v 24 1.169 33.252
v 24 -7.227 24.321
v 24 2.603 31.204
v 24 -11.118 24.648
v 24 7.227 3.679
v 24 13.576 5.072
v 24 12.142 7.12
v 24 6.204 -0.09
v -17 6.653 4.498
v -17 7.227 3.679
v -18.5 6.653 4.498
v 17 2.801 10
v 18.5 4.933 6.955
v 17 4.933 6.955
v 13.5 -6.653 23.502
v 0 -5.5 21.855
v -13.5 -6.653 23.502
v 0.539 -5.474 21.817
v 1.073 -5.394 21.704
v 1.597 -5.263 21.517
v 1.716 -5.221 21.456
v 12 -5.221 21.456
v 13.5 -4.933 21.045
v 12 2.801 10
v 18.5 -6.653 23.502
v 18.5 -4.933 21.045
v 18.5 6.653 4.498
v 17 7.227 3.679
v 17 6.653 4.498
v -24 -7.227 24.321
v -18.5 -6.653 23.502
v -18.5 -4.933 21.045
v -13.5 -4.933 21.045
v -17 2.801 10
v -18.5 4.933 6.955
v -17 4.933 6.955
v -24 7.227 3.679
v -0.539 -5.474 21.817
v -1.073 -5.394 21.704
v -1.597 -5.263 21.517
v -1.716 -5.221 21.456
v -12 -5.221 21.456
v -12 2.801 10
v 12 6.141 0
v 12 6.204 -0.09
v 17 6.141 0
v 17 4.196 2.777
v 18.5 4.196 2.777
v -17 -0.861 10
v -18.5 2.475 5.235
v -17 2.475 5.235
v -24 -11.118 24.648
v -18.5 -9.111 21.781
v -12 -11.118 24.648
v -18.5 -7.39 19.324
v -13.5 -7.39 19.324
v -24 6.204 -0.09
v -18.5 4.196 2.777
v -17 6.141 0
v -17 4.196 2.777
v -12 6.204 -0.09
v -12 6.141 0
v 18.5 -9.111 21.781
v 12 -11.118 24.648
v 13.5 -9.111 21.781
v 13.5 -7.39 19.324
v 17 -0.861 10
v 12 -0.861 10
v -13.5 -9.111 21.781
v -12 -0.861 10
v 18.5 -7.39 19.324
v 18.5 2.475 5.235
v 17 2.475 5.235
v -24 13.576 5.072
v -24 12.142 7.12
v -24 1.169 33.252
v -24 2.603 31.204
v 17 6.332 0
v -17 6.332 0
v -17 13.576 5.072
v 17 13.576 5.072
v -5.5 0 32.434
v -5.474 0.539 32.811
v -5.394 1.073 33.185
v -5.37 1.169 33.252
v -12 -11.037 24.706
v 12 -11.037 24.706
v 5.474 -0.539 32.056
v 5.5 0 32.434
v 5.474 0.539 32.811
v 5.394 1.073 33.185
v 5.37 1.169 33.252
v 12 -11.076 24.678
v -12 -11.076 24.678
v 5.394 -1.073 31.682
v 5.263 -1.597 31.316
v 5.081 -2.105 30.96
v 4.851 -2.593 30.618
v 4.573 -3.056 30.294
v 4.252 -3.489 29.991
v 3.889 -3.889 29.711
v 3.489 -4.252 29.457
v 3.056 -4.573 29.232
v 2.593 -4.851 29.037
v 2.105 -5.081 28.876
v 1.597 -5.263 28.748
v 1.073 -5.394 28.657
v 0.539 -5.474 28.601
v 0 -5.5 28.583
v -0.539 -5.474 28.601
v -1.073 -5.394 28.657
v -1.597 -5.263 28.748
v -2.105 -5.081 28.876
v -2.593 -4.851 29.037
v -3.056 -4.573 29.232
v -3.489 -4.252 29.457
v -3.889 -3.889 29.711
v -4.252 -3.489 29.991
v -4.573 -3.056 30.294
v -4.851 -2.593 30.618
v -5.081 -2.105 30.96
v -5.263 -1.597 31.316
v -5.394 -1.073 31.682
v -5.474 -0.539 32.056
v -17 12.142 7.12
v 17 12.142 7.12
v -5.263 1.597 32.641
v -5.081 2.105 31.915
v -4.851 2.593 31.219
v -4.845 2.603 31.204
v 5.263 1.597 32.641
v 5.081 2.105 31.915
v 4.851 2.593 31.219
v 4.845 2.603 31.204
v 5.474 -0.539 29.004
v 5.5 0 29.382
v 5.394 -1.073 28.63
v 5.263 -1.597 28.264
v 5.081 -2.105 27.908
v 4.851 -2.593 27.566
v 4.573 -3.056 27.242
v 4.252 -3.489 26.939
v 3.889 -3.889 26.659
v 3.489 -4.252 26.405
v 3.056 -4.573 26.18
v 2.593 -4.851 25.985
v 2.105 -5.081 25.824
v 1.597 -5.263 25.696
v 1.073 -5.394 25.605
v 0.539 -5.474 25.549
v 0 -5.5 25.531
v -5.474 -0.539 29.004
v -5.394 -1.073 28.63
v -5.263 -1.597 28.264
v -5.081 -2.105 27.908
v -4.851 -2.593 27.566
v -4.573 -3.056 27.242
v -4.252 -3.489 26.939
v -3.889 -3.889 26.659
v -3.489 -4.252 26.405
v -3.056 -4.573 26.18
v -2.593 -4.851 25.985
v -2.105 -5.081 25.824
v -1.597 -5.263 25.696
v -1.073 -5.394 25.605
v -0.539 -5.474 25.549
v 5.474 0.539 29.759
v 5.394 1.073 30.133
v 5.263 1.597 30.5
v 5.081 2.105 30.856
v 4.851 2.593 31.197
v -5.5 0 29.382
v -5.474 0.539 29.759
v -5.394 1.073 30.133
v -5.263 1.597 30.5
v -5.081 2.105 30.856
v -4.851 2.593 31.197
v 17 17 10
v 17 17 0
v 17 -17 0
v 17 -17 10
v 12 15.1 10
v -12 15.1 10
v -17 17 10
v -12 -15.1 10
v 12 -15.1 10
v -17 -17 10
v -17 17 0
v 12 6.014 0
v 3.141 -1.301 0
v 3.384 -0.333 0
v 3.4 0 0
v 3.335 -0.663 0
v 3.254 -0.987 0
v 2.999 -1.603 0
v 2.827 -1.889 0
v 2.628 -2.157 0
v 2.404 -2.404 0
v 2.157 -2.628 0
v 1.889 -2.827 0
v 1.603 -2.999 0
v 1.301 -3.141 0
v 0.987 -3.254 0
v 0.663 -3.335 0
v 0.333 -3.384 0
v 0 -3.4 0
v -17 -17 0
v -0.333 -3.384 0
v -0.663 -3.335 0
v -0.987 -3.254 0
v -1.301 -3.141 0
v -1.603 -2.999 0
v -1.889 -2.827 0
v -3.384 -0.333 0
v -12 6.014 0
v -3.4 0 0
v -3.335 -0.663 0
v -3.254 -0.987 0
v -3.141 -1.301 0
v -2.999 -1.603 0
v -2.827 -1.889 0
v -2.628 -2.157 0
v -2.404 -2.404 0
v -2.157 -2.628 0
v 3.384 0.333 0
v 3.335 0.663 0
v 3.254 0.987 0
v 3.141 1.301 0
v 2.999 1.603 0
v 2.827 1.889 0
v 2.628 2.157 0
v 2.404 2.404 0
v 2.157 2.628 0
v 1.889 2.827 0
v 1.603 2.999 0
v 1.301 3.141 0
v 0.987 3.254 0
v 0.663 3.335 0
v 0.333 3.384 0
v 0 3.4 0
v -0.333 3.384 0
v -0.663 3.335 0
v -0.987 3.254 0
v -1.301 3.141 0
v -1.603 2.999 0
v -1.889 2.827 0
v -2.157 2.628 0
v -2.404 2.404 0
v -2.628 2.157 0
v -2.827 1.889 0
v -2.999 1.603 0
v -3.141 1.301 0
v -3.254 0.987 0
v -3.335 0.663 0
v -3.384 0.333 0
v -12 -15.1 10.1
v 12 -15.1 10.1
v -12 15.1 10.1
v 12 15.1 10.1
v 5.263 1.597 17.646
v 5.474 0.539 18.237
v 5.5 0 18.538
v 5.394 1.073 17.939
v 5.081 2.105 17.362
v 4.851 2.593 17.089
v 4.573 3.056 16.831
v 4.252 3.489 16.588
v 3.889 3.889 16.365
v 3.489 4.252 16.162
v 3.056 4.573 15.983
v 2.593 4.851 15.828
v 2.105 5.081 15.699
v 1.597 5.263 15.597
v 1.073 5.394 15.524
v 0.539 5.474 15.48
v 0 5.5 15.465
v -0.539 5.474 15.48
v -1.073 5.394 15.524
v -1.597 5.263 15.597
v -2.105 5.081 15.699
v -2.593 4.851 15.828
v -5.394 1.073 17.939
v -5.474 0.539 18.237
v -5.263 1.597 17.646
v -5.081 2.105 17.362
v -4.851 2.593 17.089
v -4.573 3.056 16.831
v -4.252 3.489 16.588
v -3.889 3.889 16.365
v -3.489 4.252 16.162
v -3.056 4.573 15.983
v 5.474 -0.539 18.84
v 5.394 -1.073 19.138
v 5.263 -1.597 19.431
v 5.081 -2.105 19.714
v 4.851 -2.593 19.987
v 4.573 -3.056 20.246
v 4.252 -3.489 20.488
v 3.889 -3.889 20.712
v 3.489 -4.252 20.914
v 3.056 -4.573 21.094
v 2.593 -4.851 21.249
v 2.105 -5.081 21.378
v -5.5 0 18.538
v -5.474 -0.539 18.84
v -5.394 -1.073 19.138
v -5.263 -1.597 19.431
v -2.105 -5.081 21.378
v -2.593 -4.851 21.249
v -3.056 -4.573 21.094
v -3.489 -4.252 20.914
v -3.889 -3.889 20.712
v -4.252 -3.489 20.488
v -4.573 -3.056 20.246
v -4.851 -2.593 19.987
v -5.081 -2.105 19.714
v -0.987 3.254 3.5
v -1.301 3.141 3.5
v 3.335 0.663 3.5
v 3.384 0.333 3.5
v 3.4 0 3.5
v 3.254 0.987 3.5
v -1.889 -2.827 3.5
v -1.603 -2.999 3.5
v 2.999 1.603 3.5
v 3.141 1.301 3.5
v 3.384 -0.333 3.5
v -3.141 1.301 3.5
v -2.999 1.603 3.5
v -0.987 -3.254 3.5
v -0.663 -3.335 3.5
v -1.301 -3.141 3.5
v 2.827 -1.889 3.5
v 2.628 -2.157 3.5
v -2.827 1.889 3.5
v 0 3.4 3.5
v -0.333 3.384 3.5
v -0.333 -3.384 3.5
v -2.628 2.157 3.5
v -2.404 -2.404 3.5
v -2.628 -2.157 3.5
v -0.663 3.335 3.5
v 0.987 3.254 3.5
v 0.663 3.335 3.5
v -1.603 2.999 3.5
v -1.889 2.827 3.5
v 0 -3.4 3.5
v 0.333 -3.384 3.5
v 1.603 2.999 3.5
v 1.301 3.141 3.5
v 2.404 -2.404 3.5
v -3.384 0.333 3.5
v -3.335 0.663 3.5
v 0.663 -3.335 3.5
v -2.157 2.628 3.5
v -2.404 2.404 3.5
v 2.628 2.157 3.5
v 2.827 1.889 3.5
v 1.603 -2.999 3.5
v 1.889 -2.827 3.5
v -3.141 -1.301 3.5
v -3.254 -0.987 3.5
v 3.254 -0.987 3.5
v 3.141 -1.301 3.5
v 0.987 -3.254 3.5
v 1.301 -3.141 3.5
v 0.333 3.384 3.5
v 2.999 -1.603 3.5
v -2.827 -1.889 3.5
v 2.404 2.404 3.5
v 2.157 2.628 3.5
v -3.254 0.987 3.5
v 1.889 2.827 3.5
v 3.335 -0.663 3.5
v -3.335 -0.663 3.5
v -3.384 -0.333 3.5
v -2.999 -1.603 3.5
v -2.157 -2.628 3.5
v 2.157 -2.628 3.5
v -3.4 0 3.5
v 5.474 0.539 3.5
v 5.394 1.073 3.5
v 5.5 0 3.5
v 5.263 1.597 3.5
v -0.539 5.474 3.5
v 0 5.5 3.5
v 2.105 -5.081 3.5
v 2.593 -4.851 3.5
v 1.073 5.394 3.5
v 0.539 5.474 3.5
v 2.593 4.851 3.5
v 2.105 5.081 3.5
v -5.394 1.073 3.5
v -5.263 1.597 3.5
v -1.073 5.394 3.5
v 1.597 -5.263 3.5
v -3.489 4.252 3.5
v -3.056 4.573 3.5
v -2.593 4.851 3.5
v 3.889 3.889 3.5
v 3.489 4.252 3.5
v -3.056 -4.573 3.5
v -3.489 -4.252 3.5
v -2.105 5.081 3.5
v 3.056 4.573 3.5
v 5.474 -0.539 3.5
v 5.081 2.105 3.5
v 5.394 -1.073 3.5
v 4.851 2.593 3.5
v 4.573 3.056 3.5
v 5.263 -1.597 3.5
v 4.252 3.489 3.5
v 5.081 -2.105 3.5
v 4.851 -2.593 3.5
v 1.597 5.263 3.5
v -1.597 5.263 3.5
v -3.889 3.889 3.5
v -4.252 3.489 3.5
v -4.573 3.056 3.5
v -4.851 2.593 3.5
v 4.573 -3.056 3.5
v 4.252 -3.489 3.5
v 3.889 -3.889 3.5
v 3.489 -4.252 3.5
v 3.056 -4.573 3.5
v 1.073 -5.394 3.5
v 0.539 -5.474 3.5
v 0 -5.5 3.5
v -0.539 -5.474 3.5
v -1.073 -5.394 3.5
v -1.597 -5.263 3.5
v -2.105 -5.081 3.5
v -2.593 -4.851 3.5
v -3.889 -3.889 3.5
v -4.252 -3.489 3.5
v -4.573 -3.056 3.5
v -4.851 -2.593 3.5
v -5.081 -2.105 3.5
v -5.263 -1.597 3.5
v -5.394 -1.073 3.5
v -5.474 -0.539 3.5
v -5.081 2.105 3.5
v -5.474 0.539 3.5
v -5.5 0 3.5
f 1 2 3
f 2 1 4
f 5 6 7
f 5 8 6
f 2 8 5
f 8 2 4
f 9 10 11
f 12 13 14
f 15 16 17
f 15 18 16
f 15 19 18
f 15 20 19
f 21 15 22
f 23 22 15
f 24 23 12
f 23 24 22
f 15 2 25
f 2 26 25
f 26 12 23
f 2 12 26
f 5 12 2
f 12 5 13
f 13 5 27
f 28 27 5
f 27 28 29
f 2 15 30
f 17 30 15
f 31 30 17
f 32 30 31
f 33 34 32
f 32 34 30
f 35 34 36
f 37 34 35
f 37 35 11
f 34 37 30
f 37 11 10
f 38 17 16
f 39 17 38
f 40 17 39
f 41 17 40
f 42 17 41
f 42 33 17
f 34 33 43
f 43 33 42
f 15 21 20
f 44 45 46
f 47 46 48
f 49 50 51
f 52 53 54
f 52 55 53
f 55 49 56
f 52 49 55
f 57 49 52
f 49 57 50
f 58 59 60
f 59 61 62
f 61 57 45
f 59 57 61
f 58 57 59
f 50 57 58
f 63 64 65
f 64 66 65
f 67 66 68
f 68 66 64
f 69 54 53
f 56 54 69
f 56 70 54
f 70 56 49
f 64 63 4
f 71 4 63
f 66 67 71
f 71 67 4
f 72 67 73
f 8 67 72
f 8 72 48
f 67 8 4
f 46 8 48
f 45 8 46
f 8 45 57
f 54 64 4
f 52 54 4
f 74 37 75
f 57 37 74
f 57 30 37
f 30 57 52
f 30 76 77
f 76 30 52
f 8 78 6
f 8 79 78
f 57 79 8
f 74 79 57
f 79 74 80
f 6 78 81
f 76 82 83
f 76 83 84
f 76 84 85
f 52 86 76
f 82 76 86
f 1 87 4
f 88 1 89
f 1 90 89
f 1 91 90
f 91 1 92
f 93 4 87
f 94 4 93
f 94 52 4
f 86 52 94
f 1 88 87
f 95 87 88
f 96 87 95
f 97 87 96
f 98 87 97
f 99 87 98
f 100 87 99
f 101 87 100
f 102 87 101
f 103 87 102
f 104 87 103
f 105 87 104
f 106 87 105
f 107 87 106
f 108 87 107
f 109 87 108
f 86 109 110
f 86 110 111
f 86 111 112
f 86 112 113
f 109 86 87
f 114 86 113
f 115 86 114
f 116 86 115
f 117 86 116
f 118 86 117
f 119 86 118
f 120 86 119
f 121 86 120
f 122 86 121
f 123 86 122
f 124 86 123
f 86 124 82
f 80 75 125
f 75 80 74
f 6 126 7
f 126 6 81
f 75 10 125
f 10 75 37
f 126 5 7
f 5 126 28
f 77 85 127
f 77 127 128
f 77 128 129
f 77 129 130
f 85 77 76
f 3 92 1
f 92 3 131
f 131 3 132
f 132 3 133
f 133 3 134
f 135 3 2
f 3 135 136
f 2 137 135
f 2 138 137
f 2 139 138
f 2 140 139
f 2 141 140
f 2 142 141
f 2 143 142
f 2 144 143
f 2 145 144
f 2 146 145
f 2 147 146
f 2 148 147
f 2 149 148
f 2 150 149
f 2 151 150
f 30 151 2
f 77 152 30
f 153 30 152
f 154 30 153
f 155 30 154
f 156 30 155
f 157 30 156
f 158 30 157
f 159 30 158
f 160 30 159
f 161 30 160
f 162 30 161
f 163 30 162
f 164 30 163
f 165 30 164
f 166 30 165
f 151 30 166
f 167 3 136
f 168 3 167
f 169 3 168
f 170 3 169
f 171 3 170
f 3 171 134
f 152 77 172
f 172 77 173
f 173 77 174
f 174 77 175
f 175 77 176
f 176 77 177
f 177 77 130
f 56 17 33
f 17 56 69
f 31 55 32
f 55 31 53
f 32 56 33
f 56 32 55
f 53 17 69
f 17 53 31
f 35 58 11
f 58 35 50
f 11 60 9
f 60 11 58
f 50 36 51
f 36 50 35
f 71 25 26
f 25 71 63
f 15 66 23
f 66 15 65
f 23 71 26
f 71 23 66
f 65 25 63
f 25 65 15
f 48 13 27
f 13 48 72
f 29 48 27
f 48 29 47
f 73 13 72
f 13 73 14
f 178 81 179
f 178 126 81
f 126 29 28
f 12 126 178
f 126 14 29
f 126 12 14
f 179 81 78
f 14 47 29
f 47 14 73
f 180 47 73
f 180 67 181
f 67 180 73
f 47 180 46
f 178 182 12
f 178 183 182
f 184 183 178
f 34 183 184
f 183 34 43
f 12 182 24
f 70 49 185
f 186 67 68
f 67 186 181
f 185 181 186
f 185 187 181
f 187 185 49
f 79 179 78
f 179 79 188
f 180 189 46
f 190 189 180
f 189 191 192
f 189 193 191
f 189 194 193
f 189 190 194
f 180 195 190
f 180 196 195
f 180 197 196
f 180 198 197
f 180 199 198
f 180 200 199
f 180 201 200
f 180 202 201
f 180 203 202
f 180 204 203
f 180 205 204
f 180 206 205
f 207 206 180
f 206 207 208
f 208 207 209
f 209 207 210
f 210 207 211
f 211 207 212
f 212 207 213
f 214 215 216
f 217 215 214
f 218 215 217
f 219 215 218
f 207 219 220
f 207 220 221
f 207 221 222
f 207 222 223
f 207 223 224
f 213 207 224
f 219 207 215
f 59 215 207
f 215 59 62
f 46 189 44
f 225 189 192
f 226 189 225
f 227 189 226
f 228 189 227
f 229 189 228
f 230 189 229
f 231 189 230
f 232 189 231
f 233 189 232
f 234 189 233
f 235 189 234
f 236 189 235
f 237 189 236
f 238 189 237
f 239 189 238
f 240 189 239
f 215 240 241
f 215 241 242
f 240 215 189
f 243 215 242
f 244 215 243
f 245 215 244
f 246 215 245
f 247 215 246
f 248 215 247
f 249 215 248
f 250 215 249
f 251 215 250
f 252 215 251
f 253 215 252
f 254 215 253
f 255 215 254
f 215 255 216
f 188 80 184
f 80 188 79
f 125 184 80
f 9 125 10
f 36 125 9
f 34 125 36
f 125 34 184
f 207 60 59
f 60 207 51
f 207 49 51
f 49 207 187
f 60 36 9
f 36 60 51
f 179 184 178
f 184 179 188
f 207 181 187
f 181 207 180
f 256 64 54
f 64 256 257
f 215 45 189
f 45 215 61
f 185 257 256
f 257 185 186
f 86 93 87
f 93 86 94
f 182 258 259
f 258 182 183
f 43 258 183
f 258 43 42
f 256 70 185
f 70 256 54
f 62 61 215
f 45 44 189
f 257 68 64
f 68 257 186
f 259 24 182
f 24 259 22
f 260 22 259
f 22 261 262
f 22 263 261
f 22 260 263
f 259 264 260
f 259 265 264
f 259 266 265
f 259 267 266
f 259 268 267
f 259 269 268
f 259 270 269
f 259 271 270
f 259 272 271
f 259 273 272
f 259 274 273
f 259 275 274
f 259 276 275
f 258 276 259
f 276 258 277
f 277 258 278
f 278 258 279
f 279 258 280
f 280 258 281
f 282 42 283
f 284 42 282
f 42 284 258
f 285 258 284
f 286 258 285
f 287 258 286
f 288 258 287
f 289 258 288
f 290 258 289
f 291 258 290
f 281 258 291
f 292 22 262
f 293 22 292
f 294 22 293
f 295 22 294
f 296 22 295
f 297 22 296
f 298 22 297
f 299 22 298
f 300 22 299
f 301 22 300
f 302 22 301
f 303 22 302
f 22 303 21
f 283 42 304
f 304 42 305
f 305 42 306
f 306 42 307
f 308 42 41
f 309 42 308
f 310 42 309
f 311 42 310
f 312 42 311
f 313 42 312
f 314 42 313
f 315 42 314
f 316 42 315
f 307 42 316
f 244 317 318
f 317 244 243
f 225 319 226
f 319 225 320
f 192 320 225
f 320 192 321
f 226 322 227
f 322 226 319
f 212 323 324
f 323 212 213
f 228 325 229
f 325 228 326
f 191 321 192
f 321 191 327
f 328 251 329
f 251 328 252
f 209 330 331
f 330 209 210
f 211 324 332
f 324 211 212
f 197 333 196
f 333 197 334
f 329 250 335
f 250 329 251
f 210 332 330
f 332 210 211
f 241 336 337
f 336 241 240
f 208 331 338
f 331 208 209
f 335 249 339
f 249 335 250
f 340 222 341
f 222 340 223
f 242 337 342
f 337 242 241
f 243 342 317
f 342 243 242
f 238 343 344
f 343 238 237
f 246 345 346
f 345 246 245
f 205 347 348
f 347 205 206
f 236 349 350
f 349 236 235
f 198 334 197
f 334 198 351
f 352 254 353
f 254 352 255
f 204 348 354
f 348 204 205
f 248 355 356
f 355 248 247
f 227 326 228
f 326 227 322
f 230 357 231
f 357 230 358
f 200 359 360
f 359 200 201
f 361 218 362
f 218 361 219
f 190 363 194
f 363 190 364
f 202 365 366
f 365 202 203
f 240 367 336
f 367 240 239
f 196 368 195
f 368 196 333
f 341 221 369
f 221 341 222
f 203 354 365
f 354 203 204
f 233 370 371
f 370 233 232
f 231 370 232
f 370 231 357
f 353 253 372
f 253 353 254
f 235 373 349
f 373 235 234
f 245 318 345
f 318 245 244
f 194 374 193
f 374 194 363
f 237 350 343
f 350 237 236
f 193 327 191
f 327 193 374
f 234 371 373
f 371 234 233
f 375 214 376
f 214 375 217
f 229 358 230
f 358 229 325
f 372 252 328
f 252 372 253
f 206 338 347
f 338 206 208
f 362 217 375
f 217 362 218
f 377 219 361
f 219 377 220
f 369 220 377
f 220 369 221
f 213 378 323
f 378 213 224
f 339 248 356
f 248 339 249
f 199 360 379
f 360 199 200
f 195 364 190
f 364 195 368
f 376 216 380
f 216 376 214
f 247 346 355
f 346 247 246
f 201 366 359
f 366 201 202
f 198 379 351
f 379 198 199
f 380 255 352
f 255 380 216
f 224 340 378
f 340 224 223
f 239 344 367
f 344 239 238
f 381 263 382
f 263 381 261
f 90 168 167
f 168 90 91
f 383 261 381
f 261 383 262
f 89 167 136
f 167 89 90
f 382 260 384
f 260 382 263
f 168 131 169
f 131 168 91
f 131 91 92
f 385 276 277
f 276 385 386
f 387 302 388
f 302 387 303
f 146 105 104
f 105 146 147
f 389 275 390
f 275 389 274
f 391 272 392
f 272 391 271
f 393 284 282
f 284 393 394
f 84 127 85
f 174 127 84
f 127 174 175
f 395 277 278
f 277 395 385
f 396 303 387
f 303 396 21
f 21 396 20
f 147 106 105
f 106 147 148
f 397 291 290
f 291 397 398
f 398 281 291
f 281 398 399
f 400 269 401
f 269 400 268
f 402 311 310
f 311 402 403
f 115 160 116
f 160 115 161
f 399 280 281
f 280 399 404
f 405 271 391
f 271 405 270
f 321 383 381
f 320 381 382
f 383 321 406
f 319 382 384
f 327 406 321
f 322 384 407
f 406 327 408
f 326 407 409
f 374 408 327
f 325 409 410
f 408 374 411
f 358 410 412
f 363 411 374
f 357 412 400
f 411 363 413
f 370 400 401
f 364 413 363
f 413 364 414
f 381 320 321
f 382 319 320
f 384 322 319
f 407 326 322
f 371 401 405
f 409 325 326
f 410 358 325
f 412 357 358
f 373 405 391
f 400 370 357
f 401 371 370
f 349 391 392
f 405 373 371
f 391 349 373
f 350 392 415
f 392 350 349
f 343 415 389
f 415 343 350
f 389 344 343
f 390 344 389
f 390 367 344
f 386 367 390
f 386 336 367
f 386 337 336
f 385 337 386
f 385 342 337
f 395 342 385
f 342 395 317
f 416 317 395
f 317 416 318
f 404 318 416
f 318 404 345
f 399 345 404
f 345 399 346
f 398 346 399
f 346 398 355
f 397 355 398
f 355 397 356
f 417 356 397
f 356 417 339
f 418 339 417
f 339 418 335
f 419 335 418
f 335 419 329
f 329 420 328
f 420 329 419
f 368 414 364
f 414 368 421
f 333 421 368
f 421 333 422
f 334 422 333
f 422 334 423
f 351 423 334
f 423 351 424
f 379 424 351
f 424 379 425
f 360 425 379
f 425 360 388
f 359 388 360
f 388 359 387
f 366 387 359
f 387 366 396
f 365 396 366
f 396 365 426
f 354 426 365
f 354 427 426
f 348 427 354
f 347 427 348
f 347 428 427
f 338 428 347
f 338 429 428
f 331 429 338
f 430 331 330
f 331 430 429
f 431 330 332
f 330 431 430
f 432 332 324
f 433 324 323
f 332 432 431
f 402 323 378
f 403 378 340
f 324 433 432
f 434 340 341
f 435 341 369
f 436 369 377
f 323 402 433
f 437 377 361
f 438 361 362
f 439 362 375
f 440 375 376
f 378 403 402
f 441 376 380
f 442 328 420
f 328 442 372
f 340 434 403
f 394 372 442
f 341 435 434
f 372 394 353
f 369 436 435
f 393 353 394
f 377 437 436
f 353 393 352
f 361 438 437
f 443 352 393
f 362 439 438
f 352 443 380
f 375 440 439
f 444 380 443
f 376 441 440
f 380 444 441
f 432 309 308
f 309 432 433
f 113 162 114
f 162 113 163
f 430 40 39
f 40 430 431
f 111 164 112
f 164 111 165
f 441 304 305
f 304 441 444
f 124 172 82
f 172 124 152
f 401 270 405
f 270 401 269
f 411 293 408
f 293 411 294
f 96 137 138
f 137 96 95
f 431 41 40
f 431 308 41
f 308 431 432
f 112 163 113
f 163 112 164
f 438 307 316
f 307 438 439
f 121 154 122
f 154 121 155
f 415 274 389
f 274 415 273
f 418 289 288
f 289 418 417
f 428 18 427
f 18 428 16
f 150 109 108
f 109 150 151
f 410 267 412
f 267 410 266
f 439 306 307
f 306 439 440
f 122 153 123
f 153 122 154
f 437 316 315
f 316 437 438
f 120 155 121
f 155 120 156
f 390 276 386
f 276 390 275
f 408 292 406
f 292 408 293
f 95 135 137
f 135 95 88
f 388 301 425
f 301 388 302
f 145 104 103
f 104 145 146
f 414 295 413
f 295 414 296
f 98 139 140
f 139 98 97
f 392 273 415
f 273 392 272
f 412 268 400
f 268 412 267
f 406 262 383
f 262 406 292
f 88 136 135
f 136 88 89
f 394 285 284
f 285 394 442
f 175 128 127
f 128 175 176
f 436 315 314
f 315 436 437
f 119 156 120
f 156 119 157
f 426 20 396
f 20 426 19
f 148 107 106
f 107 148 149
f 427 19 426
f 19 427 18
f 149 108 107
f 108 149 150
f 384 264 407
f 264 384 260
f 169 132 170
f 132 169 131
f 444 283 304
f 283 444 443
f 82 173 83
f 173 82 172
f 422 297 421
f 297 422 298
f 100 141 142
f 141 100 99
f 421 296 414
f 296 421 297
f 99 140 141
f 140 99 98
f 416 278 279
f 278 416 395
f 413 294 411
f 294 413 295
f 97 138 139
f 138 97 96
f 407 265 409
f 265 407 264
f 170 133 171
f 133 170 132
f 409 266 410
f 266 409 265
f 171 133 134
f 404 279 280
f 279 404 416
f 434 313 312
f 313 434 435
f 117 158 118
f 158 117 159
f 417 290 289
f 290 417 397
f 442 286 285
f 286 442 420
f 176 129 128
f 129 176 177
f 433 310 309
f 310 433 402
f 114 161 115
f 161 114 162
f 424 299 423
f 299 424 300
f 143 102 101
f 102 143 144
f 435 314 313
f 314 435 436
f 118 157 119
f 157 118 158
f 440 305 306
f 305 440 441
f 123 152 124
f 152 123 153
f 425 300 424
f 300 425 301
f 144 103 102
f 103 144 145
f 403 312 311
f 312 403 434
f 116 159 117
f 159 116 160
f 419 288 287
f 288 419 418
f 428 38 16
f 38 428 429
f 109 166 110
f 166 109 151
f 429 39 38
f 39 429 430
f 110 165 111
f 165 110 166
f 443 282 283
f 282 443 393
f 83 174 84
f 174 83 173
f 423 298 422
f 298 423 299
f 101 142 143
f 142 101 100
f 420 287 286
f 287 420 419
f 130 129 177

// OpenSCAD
// file: cam_tray_lib.scad
include <config.scad>

// ============================================================
// SHARED C310 TRAY — library only, nothing to print from here.
// Used (via `use <>`) by wrist_camera_mount.scad and
// tower_camera_cradle.scad.
//
// Tray coordinate convention: origin at the center of the tray
// FLOOR TOP surface; the camera sits on it with its long axis
// along X, optical axis along +Y (lens side = +Y wall, which is
// kept low so it stays below the lens), body height along +Z.
// The tray is shorter than the camera body (tray_len < body
// width) so both ends stay open; two pairs of zip-tie slots
// through the floor strap the housing down — tolerant of the
// CONFIRM-flagged body dimensions.
// ============================================================

// inner tray depth (Y) around the camera body
function tray_inner_d() = cam_body_d + 2*cam_fit_clear;
// outer tray depth (Y) including both walls
function tray_outer_d() = tray_inner_d() + 2*tray_wall;

module cam_tray() {
    iw = tray_inner_d();
    difference() {
        union() {
            // floor
            translate([-tray_len/2, -iw/2 - tray_wall, -tray_floor])
                cube([tray_len, tray_outer_d(), tray_floor]);
            // front wall (+Y, lens side) — low, below the lens
            translate([-tray_len/2, iw/2, 0])
                cube([tray_len, tray_wall, tray_lip_front]);
            // back wall (-Y) — tall, takes the tilt load
            translate([-tray_len/2, -iw/2 - tray_wall, 0])
                cube([tray_len, tray_wall, tray_lip_back]);
        }
        // zip-tie slots: two per tie, just inside each wall, at
        // +/- zip_slot_x. Thread the ties before dropping the
        // camera in, then tighten over the housing.
        for (sx = [-1, 1]) for (sy = [-1, 1])
            translate([sx*zip_slot_x - zip_slot_w/2,
                       sy*(iw/2 - 1) - (sy > 0 ? zip_slot_t : 0),
                       -tray_floor - 1])
                cube([zip_slot_w, zip_slot_t, tray_floor + 2]);
    }
}

// Sloped pedestal connecting a flat base (top face at z=base_top,
// footprint pedestal_w wide in X, tray_outer_d deep in Y centered
// on y=fwd) to the underside of the tilted tray. The hull of the
// two slabs gives a solid printable wedge.
//
// tilt > 0 pitches the optical axis (+Y) downward (toward -Z).
module cam_tray_pedestal(base_top, fwd, rise, tilt, pedestal_w) {
    hull() {
        translate([-pedestal_w/2, fwd - tray_outer_d()/2, base_top])
            cube([pedestal_w, tray_outer_d(), 0.1]);
        cam_tray_place(fwd, base_top + rise, tilt)
            translate([-pedestal_w/2, -tray_outer_d()/2, -tray_floor])
                cube([pedestal_w, tray_outer_d(), 0.1]);
    }
}

// Places children from tray coordinates into part coordinates:
// tilt about X (optical +Y dips toward -Z), then move the floor-top
// origin to (0, fwd, z_floor).
module cam_tray_place(fwd, z_floor, tilt) {
    translate([0, fwd, z_floor]) rotate([-tilt, 0, 0]) children();
}
// main file
include <config.scad>
use <cam_tray_lib.scad>

// ============================================================
// TOWER CAMERA CRADLE — Logitech C310 (clip removed) on the camera
// tower's top platform. Print x1. The C310 has no tripod thread,
// so this cradle bolts into the platform's 1/4"-20 heat-set insert
// with a single 1/4"-20 socket-head bolt and pitches the camera
// tower_cam_tilt_deg down at the workspace.
//
// PART FRAME: origin at the bolt axis on the platform surface;
// +Y is the camera's look direction (aim it at the workspace —
// along the arms' forward axis — before tightening), +Z up.
//
// BOLT ACCESS: the head is counterbored inside the base block and
// reached with a 3/16" allen key through the shaft that continues
// up through the pedestal and tray floor. One bolt only — tighten
// firmly; the sim assumes the tray points along the arms' +X.
// ============================================================

pedestal_w = 24;

module tower_camera_cradle() {
    difference() {
        union() {
            translate([-tower_cradle_base/2, -tower_cradle_base/2, 0])
                cube([tower_cradle_base, tower_cradle_base,
                      tower_cradle_thick]);
            cam_tray_pedestal(tower_cradle_thick, 0, tower_cam_rise,
                               tower_cam_tilt_deg, pedestal_w);
            cam_tray_place(0, tower_cradle_thick + tower_cam_rise,
                            tower_cam_tilt_deg)
                cam_tray();
        }
        // 1/4"-20: clearance through the base, head counterbored,
        // allen-key shaft continuing up through pedestal and tray
        translate([0, 0, -1])
            cylinder(h=tower_cradle_thick + 2, d=quarter20_clear_dia);
        translate([0, 0, tower_cradle_thick - quarter20_head_h])
            cylinder(h=100, d=quarter20_head_dia + 0.5);
    }
}

tower_camera_cradle();
